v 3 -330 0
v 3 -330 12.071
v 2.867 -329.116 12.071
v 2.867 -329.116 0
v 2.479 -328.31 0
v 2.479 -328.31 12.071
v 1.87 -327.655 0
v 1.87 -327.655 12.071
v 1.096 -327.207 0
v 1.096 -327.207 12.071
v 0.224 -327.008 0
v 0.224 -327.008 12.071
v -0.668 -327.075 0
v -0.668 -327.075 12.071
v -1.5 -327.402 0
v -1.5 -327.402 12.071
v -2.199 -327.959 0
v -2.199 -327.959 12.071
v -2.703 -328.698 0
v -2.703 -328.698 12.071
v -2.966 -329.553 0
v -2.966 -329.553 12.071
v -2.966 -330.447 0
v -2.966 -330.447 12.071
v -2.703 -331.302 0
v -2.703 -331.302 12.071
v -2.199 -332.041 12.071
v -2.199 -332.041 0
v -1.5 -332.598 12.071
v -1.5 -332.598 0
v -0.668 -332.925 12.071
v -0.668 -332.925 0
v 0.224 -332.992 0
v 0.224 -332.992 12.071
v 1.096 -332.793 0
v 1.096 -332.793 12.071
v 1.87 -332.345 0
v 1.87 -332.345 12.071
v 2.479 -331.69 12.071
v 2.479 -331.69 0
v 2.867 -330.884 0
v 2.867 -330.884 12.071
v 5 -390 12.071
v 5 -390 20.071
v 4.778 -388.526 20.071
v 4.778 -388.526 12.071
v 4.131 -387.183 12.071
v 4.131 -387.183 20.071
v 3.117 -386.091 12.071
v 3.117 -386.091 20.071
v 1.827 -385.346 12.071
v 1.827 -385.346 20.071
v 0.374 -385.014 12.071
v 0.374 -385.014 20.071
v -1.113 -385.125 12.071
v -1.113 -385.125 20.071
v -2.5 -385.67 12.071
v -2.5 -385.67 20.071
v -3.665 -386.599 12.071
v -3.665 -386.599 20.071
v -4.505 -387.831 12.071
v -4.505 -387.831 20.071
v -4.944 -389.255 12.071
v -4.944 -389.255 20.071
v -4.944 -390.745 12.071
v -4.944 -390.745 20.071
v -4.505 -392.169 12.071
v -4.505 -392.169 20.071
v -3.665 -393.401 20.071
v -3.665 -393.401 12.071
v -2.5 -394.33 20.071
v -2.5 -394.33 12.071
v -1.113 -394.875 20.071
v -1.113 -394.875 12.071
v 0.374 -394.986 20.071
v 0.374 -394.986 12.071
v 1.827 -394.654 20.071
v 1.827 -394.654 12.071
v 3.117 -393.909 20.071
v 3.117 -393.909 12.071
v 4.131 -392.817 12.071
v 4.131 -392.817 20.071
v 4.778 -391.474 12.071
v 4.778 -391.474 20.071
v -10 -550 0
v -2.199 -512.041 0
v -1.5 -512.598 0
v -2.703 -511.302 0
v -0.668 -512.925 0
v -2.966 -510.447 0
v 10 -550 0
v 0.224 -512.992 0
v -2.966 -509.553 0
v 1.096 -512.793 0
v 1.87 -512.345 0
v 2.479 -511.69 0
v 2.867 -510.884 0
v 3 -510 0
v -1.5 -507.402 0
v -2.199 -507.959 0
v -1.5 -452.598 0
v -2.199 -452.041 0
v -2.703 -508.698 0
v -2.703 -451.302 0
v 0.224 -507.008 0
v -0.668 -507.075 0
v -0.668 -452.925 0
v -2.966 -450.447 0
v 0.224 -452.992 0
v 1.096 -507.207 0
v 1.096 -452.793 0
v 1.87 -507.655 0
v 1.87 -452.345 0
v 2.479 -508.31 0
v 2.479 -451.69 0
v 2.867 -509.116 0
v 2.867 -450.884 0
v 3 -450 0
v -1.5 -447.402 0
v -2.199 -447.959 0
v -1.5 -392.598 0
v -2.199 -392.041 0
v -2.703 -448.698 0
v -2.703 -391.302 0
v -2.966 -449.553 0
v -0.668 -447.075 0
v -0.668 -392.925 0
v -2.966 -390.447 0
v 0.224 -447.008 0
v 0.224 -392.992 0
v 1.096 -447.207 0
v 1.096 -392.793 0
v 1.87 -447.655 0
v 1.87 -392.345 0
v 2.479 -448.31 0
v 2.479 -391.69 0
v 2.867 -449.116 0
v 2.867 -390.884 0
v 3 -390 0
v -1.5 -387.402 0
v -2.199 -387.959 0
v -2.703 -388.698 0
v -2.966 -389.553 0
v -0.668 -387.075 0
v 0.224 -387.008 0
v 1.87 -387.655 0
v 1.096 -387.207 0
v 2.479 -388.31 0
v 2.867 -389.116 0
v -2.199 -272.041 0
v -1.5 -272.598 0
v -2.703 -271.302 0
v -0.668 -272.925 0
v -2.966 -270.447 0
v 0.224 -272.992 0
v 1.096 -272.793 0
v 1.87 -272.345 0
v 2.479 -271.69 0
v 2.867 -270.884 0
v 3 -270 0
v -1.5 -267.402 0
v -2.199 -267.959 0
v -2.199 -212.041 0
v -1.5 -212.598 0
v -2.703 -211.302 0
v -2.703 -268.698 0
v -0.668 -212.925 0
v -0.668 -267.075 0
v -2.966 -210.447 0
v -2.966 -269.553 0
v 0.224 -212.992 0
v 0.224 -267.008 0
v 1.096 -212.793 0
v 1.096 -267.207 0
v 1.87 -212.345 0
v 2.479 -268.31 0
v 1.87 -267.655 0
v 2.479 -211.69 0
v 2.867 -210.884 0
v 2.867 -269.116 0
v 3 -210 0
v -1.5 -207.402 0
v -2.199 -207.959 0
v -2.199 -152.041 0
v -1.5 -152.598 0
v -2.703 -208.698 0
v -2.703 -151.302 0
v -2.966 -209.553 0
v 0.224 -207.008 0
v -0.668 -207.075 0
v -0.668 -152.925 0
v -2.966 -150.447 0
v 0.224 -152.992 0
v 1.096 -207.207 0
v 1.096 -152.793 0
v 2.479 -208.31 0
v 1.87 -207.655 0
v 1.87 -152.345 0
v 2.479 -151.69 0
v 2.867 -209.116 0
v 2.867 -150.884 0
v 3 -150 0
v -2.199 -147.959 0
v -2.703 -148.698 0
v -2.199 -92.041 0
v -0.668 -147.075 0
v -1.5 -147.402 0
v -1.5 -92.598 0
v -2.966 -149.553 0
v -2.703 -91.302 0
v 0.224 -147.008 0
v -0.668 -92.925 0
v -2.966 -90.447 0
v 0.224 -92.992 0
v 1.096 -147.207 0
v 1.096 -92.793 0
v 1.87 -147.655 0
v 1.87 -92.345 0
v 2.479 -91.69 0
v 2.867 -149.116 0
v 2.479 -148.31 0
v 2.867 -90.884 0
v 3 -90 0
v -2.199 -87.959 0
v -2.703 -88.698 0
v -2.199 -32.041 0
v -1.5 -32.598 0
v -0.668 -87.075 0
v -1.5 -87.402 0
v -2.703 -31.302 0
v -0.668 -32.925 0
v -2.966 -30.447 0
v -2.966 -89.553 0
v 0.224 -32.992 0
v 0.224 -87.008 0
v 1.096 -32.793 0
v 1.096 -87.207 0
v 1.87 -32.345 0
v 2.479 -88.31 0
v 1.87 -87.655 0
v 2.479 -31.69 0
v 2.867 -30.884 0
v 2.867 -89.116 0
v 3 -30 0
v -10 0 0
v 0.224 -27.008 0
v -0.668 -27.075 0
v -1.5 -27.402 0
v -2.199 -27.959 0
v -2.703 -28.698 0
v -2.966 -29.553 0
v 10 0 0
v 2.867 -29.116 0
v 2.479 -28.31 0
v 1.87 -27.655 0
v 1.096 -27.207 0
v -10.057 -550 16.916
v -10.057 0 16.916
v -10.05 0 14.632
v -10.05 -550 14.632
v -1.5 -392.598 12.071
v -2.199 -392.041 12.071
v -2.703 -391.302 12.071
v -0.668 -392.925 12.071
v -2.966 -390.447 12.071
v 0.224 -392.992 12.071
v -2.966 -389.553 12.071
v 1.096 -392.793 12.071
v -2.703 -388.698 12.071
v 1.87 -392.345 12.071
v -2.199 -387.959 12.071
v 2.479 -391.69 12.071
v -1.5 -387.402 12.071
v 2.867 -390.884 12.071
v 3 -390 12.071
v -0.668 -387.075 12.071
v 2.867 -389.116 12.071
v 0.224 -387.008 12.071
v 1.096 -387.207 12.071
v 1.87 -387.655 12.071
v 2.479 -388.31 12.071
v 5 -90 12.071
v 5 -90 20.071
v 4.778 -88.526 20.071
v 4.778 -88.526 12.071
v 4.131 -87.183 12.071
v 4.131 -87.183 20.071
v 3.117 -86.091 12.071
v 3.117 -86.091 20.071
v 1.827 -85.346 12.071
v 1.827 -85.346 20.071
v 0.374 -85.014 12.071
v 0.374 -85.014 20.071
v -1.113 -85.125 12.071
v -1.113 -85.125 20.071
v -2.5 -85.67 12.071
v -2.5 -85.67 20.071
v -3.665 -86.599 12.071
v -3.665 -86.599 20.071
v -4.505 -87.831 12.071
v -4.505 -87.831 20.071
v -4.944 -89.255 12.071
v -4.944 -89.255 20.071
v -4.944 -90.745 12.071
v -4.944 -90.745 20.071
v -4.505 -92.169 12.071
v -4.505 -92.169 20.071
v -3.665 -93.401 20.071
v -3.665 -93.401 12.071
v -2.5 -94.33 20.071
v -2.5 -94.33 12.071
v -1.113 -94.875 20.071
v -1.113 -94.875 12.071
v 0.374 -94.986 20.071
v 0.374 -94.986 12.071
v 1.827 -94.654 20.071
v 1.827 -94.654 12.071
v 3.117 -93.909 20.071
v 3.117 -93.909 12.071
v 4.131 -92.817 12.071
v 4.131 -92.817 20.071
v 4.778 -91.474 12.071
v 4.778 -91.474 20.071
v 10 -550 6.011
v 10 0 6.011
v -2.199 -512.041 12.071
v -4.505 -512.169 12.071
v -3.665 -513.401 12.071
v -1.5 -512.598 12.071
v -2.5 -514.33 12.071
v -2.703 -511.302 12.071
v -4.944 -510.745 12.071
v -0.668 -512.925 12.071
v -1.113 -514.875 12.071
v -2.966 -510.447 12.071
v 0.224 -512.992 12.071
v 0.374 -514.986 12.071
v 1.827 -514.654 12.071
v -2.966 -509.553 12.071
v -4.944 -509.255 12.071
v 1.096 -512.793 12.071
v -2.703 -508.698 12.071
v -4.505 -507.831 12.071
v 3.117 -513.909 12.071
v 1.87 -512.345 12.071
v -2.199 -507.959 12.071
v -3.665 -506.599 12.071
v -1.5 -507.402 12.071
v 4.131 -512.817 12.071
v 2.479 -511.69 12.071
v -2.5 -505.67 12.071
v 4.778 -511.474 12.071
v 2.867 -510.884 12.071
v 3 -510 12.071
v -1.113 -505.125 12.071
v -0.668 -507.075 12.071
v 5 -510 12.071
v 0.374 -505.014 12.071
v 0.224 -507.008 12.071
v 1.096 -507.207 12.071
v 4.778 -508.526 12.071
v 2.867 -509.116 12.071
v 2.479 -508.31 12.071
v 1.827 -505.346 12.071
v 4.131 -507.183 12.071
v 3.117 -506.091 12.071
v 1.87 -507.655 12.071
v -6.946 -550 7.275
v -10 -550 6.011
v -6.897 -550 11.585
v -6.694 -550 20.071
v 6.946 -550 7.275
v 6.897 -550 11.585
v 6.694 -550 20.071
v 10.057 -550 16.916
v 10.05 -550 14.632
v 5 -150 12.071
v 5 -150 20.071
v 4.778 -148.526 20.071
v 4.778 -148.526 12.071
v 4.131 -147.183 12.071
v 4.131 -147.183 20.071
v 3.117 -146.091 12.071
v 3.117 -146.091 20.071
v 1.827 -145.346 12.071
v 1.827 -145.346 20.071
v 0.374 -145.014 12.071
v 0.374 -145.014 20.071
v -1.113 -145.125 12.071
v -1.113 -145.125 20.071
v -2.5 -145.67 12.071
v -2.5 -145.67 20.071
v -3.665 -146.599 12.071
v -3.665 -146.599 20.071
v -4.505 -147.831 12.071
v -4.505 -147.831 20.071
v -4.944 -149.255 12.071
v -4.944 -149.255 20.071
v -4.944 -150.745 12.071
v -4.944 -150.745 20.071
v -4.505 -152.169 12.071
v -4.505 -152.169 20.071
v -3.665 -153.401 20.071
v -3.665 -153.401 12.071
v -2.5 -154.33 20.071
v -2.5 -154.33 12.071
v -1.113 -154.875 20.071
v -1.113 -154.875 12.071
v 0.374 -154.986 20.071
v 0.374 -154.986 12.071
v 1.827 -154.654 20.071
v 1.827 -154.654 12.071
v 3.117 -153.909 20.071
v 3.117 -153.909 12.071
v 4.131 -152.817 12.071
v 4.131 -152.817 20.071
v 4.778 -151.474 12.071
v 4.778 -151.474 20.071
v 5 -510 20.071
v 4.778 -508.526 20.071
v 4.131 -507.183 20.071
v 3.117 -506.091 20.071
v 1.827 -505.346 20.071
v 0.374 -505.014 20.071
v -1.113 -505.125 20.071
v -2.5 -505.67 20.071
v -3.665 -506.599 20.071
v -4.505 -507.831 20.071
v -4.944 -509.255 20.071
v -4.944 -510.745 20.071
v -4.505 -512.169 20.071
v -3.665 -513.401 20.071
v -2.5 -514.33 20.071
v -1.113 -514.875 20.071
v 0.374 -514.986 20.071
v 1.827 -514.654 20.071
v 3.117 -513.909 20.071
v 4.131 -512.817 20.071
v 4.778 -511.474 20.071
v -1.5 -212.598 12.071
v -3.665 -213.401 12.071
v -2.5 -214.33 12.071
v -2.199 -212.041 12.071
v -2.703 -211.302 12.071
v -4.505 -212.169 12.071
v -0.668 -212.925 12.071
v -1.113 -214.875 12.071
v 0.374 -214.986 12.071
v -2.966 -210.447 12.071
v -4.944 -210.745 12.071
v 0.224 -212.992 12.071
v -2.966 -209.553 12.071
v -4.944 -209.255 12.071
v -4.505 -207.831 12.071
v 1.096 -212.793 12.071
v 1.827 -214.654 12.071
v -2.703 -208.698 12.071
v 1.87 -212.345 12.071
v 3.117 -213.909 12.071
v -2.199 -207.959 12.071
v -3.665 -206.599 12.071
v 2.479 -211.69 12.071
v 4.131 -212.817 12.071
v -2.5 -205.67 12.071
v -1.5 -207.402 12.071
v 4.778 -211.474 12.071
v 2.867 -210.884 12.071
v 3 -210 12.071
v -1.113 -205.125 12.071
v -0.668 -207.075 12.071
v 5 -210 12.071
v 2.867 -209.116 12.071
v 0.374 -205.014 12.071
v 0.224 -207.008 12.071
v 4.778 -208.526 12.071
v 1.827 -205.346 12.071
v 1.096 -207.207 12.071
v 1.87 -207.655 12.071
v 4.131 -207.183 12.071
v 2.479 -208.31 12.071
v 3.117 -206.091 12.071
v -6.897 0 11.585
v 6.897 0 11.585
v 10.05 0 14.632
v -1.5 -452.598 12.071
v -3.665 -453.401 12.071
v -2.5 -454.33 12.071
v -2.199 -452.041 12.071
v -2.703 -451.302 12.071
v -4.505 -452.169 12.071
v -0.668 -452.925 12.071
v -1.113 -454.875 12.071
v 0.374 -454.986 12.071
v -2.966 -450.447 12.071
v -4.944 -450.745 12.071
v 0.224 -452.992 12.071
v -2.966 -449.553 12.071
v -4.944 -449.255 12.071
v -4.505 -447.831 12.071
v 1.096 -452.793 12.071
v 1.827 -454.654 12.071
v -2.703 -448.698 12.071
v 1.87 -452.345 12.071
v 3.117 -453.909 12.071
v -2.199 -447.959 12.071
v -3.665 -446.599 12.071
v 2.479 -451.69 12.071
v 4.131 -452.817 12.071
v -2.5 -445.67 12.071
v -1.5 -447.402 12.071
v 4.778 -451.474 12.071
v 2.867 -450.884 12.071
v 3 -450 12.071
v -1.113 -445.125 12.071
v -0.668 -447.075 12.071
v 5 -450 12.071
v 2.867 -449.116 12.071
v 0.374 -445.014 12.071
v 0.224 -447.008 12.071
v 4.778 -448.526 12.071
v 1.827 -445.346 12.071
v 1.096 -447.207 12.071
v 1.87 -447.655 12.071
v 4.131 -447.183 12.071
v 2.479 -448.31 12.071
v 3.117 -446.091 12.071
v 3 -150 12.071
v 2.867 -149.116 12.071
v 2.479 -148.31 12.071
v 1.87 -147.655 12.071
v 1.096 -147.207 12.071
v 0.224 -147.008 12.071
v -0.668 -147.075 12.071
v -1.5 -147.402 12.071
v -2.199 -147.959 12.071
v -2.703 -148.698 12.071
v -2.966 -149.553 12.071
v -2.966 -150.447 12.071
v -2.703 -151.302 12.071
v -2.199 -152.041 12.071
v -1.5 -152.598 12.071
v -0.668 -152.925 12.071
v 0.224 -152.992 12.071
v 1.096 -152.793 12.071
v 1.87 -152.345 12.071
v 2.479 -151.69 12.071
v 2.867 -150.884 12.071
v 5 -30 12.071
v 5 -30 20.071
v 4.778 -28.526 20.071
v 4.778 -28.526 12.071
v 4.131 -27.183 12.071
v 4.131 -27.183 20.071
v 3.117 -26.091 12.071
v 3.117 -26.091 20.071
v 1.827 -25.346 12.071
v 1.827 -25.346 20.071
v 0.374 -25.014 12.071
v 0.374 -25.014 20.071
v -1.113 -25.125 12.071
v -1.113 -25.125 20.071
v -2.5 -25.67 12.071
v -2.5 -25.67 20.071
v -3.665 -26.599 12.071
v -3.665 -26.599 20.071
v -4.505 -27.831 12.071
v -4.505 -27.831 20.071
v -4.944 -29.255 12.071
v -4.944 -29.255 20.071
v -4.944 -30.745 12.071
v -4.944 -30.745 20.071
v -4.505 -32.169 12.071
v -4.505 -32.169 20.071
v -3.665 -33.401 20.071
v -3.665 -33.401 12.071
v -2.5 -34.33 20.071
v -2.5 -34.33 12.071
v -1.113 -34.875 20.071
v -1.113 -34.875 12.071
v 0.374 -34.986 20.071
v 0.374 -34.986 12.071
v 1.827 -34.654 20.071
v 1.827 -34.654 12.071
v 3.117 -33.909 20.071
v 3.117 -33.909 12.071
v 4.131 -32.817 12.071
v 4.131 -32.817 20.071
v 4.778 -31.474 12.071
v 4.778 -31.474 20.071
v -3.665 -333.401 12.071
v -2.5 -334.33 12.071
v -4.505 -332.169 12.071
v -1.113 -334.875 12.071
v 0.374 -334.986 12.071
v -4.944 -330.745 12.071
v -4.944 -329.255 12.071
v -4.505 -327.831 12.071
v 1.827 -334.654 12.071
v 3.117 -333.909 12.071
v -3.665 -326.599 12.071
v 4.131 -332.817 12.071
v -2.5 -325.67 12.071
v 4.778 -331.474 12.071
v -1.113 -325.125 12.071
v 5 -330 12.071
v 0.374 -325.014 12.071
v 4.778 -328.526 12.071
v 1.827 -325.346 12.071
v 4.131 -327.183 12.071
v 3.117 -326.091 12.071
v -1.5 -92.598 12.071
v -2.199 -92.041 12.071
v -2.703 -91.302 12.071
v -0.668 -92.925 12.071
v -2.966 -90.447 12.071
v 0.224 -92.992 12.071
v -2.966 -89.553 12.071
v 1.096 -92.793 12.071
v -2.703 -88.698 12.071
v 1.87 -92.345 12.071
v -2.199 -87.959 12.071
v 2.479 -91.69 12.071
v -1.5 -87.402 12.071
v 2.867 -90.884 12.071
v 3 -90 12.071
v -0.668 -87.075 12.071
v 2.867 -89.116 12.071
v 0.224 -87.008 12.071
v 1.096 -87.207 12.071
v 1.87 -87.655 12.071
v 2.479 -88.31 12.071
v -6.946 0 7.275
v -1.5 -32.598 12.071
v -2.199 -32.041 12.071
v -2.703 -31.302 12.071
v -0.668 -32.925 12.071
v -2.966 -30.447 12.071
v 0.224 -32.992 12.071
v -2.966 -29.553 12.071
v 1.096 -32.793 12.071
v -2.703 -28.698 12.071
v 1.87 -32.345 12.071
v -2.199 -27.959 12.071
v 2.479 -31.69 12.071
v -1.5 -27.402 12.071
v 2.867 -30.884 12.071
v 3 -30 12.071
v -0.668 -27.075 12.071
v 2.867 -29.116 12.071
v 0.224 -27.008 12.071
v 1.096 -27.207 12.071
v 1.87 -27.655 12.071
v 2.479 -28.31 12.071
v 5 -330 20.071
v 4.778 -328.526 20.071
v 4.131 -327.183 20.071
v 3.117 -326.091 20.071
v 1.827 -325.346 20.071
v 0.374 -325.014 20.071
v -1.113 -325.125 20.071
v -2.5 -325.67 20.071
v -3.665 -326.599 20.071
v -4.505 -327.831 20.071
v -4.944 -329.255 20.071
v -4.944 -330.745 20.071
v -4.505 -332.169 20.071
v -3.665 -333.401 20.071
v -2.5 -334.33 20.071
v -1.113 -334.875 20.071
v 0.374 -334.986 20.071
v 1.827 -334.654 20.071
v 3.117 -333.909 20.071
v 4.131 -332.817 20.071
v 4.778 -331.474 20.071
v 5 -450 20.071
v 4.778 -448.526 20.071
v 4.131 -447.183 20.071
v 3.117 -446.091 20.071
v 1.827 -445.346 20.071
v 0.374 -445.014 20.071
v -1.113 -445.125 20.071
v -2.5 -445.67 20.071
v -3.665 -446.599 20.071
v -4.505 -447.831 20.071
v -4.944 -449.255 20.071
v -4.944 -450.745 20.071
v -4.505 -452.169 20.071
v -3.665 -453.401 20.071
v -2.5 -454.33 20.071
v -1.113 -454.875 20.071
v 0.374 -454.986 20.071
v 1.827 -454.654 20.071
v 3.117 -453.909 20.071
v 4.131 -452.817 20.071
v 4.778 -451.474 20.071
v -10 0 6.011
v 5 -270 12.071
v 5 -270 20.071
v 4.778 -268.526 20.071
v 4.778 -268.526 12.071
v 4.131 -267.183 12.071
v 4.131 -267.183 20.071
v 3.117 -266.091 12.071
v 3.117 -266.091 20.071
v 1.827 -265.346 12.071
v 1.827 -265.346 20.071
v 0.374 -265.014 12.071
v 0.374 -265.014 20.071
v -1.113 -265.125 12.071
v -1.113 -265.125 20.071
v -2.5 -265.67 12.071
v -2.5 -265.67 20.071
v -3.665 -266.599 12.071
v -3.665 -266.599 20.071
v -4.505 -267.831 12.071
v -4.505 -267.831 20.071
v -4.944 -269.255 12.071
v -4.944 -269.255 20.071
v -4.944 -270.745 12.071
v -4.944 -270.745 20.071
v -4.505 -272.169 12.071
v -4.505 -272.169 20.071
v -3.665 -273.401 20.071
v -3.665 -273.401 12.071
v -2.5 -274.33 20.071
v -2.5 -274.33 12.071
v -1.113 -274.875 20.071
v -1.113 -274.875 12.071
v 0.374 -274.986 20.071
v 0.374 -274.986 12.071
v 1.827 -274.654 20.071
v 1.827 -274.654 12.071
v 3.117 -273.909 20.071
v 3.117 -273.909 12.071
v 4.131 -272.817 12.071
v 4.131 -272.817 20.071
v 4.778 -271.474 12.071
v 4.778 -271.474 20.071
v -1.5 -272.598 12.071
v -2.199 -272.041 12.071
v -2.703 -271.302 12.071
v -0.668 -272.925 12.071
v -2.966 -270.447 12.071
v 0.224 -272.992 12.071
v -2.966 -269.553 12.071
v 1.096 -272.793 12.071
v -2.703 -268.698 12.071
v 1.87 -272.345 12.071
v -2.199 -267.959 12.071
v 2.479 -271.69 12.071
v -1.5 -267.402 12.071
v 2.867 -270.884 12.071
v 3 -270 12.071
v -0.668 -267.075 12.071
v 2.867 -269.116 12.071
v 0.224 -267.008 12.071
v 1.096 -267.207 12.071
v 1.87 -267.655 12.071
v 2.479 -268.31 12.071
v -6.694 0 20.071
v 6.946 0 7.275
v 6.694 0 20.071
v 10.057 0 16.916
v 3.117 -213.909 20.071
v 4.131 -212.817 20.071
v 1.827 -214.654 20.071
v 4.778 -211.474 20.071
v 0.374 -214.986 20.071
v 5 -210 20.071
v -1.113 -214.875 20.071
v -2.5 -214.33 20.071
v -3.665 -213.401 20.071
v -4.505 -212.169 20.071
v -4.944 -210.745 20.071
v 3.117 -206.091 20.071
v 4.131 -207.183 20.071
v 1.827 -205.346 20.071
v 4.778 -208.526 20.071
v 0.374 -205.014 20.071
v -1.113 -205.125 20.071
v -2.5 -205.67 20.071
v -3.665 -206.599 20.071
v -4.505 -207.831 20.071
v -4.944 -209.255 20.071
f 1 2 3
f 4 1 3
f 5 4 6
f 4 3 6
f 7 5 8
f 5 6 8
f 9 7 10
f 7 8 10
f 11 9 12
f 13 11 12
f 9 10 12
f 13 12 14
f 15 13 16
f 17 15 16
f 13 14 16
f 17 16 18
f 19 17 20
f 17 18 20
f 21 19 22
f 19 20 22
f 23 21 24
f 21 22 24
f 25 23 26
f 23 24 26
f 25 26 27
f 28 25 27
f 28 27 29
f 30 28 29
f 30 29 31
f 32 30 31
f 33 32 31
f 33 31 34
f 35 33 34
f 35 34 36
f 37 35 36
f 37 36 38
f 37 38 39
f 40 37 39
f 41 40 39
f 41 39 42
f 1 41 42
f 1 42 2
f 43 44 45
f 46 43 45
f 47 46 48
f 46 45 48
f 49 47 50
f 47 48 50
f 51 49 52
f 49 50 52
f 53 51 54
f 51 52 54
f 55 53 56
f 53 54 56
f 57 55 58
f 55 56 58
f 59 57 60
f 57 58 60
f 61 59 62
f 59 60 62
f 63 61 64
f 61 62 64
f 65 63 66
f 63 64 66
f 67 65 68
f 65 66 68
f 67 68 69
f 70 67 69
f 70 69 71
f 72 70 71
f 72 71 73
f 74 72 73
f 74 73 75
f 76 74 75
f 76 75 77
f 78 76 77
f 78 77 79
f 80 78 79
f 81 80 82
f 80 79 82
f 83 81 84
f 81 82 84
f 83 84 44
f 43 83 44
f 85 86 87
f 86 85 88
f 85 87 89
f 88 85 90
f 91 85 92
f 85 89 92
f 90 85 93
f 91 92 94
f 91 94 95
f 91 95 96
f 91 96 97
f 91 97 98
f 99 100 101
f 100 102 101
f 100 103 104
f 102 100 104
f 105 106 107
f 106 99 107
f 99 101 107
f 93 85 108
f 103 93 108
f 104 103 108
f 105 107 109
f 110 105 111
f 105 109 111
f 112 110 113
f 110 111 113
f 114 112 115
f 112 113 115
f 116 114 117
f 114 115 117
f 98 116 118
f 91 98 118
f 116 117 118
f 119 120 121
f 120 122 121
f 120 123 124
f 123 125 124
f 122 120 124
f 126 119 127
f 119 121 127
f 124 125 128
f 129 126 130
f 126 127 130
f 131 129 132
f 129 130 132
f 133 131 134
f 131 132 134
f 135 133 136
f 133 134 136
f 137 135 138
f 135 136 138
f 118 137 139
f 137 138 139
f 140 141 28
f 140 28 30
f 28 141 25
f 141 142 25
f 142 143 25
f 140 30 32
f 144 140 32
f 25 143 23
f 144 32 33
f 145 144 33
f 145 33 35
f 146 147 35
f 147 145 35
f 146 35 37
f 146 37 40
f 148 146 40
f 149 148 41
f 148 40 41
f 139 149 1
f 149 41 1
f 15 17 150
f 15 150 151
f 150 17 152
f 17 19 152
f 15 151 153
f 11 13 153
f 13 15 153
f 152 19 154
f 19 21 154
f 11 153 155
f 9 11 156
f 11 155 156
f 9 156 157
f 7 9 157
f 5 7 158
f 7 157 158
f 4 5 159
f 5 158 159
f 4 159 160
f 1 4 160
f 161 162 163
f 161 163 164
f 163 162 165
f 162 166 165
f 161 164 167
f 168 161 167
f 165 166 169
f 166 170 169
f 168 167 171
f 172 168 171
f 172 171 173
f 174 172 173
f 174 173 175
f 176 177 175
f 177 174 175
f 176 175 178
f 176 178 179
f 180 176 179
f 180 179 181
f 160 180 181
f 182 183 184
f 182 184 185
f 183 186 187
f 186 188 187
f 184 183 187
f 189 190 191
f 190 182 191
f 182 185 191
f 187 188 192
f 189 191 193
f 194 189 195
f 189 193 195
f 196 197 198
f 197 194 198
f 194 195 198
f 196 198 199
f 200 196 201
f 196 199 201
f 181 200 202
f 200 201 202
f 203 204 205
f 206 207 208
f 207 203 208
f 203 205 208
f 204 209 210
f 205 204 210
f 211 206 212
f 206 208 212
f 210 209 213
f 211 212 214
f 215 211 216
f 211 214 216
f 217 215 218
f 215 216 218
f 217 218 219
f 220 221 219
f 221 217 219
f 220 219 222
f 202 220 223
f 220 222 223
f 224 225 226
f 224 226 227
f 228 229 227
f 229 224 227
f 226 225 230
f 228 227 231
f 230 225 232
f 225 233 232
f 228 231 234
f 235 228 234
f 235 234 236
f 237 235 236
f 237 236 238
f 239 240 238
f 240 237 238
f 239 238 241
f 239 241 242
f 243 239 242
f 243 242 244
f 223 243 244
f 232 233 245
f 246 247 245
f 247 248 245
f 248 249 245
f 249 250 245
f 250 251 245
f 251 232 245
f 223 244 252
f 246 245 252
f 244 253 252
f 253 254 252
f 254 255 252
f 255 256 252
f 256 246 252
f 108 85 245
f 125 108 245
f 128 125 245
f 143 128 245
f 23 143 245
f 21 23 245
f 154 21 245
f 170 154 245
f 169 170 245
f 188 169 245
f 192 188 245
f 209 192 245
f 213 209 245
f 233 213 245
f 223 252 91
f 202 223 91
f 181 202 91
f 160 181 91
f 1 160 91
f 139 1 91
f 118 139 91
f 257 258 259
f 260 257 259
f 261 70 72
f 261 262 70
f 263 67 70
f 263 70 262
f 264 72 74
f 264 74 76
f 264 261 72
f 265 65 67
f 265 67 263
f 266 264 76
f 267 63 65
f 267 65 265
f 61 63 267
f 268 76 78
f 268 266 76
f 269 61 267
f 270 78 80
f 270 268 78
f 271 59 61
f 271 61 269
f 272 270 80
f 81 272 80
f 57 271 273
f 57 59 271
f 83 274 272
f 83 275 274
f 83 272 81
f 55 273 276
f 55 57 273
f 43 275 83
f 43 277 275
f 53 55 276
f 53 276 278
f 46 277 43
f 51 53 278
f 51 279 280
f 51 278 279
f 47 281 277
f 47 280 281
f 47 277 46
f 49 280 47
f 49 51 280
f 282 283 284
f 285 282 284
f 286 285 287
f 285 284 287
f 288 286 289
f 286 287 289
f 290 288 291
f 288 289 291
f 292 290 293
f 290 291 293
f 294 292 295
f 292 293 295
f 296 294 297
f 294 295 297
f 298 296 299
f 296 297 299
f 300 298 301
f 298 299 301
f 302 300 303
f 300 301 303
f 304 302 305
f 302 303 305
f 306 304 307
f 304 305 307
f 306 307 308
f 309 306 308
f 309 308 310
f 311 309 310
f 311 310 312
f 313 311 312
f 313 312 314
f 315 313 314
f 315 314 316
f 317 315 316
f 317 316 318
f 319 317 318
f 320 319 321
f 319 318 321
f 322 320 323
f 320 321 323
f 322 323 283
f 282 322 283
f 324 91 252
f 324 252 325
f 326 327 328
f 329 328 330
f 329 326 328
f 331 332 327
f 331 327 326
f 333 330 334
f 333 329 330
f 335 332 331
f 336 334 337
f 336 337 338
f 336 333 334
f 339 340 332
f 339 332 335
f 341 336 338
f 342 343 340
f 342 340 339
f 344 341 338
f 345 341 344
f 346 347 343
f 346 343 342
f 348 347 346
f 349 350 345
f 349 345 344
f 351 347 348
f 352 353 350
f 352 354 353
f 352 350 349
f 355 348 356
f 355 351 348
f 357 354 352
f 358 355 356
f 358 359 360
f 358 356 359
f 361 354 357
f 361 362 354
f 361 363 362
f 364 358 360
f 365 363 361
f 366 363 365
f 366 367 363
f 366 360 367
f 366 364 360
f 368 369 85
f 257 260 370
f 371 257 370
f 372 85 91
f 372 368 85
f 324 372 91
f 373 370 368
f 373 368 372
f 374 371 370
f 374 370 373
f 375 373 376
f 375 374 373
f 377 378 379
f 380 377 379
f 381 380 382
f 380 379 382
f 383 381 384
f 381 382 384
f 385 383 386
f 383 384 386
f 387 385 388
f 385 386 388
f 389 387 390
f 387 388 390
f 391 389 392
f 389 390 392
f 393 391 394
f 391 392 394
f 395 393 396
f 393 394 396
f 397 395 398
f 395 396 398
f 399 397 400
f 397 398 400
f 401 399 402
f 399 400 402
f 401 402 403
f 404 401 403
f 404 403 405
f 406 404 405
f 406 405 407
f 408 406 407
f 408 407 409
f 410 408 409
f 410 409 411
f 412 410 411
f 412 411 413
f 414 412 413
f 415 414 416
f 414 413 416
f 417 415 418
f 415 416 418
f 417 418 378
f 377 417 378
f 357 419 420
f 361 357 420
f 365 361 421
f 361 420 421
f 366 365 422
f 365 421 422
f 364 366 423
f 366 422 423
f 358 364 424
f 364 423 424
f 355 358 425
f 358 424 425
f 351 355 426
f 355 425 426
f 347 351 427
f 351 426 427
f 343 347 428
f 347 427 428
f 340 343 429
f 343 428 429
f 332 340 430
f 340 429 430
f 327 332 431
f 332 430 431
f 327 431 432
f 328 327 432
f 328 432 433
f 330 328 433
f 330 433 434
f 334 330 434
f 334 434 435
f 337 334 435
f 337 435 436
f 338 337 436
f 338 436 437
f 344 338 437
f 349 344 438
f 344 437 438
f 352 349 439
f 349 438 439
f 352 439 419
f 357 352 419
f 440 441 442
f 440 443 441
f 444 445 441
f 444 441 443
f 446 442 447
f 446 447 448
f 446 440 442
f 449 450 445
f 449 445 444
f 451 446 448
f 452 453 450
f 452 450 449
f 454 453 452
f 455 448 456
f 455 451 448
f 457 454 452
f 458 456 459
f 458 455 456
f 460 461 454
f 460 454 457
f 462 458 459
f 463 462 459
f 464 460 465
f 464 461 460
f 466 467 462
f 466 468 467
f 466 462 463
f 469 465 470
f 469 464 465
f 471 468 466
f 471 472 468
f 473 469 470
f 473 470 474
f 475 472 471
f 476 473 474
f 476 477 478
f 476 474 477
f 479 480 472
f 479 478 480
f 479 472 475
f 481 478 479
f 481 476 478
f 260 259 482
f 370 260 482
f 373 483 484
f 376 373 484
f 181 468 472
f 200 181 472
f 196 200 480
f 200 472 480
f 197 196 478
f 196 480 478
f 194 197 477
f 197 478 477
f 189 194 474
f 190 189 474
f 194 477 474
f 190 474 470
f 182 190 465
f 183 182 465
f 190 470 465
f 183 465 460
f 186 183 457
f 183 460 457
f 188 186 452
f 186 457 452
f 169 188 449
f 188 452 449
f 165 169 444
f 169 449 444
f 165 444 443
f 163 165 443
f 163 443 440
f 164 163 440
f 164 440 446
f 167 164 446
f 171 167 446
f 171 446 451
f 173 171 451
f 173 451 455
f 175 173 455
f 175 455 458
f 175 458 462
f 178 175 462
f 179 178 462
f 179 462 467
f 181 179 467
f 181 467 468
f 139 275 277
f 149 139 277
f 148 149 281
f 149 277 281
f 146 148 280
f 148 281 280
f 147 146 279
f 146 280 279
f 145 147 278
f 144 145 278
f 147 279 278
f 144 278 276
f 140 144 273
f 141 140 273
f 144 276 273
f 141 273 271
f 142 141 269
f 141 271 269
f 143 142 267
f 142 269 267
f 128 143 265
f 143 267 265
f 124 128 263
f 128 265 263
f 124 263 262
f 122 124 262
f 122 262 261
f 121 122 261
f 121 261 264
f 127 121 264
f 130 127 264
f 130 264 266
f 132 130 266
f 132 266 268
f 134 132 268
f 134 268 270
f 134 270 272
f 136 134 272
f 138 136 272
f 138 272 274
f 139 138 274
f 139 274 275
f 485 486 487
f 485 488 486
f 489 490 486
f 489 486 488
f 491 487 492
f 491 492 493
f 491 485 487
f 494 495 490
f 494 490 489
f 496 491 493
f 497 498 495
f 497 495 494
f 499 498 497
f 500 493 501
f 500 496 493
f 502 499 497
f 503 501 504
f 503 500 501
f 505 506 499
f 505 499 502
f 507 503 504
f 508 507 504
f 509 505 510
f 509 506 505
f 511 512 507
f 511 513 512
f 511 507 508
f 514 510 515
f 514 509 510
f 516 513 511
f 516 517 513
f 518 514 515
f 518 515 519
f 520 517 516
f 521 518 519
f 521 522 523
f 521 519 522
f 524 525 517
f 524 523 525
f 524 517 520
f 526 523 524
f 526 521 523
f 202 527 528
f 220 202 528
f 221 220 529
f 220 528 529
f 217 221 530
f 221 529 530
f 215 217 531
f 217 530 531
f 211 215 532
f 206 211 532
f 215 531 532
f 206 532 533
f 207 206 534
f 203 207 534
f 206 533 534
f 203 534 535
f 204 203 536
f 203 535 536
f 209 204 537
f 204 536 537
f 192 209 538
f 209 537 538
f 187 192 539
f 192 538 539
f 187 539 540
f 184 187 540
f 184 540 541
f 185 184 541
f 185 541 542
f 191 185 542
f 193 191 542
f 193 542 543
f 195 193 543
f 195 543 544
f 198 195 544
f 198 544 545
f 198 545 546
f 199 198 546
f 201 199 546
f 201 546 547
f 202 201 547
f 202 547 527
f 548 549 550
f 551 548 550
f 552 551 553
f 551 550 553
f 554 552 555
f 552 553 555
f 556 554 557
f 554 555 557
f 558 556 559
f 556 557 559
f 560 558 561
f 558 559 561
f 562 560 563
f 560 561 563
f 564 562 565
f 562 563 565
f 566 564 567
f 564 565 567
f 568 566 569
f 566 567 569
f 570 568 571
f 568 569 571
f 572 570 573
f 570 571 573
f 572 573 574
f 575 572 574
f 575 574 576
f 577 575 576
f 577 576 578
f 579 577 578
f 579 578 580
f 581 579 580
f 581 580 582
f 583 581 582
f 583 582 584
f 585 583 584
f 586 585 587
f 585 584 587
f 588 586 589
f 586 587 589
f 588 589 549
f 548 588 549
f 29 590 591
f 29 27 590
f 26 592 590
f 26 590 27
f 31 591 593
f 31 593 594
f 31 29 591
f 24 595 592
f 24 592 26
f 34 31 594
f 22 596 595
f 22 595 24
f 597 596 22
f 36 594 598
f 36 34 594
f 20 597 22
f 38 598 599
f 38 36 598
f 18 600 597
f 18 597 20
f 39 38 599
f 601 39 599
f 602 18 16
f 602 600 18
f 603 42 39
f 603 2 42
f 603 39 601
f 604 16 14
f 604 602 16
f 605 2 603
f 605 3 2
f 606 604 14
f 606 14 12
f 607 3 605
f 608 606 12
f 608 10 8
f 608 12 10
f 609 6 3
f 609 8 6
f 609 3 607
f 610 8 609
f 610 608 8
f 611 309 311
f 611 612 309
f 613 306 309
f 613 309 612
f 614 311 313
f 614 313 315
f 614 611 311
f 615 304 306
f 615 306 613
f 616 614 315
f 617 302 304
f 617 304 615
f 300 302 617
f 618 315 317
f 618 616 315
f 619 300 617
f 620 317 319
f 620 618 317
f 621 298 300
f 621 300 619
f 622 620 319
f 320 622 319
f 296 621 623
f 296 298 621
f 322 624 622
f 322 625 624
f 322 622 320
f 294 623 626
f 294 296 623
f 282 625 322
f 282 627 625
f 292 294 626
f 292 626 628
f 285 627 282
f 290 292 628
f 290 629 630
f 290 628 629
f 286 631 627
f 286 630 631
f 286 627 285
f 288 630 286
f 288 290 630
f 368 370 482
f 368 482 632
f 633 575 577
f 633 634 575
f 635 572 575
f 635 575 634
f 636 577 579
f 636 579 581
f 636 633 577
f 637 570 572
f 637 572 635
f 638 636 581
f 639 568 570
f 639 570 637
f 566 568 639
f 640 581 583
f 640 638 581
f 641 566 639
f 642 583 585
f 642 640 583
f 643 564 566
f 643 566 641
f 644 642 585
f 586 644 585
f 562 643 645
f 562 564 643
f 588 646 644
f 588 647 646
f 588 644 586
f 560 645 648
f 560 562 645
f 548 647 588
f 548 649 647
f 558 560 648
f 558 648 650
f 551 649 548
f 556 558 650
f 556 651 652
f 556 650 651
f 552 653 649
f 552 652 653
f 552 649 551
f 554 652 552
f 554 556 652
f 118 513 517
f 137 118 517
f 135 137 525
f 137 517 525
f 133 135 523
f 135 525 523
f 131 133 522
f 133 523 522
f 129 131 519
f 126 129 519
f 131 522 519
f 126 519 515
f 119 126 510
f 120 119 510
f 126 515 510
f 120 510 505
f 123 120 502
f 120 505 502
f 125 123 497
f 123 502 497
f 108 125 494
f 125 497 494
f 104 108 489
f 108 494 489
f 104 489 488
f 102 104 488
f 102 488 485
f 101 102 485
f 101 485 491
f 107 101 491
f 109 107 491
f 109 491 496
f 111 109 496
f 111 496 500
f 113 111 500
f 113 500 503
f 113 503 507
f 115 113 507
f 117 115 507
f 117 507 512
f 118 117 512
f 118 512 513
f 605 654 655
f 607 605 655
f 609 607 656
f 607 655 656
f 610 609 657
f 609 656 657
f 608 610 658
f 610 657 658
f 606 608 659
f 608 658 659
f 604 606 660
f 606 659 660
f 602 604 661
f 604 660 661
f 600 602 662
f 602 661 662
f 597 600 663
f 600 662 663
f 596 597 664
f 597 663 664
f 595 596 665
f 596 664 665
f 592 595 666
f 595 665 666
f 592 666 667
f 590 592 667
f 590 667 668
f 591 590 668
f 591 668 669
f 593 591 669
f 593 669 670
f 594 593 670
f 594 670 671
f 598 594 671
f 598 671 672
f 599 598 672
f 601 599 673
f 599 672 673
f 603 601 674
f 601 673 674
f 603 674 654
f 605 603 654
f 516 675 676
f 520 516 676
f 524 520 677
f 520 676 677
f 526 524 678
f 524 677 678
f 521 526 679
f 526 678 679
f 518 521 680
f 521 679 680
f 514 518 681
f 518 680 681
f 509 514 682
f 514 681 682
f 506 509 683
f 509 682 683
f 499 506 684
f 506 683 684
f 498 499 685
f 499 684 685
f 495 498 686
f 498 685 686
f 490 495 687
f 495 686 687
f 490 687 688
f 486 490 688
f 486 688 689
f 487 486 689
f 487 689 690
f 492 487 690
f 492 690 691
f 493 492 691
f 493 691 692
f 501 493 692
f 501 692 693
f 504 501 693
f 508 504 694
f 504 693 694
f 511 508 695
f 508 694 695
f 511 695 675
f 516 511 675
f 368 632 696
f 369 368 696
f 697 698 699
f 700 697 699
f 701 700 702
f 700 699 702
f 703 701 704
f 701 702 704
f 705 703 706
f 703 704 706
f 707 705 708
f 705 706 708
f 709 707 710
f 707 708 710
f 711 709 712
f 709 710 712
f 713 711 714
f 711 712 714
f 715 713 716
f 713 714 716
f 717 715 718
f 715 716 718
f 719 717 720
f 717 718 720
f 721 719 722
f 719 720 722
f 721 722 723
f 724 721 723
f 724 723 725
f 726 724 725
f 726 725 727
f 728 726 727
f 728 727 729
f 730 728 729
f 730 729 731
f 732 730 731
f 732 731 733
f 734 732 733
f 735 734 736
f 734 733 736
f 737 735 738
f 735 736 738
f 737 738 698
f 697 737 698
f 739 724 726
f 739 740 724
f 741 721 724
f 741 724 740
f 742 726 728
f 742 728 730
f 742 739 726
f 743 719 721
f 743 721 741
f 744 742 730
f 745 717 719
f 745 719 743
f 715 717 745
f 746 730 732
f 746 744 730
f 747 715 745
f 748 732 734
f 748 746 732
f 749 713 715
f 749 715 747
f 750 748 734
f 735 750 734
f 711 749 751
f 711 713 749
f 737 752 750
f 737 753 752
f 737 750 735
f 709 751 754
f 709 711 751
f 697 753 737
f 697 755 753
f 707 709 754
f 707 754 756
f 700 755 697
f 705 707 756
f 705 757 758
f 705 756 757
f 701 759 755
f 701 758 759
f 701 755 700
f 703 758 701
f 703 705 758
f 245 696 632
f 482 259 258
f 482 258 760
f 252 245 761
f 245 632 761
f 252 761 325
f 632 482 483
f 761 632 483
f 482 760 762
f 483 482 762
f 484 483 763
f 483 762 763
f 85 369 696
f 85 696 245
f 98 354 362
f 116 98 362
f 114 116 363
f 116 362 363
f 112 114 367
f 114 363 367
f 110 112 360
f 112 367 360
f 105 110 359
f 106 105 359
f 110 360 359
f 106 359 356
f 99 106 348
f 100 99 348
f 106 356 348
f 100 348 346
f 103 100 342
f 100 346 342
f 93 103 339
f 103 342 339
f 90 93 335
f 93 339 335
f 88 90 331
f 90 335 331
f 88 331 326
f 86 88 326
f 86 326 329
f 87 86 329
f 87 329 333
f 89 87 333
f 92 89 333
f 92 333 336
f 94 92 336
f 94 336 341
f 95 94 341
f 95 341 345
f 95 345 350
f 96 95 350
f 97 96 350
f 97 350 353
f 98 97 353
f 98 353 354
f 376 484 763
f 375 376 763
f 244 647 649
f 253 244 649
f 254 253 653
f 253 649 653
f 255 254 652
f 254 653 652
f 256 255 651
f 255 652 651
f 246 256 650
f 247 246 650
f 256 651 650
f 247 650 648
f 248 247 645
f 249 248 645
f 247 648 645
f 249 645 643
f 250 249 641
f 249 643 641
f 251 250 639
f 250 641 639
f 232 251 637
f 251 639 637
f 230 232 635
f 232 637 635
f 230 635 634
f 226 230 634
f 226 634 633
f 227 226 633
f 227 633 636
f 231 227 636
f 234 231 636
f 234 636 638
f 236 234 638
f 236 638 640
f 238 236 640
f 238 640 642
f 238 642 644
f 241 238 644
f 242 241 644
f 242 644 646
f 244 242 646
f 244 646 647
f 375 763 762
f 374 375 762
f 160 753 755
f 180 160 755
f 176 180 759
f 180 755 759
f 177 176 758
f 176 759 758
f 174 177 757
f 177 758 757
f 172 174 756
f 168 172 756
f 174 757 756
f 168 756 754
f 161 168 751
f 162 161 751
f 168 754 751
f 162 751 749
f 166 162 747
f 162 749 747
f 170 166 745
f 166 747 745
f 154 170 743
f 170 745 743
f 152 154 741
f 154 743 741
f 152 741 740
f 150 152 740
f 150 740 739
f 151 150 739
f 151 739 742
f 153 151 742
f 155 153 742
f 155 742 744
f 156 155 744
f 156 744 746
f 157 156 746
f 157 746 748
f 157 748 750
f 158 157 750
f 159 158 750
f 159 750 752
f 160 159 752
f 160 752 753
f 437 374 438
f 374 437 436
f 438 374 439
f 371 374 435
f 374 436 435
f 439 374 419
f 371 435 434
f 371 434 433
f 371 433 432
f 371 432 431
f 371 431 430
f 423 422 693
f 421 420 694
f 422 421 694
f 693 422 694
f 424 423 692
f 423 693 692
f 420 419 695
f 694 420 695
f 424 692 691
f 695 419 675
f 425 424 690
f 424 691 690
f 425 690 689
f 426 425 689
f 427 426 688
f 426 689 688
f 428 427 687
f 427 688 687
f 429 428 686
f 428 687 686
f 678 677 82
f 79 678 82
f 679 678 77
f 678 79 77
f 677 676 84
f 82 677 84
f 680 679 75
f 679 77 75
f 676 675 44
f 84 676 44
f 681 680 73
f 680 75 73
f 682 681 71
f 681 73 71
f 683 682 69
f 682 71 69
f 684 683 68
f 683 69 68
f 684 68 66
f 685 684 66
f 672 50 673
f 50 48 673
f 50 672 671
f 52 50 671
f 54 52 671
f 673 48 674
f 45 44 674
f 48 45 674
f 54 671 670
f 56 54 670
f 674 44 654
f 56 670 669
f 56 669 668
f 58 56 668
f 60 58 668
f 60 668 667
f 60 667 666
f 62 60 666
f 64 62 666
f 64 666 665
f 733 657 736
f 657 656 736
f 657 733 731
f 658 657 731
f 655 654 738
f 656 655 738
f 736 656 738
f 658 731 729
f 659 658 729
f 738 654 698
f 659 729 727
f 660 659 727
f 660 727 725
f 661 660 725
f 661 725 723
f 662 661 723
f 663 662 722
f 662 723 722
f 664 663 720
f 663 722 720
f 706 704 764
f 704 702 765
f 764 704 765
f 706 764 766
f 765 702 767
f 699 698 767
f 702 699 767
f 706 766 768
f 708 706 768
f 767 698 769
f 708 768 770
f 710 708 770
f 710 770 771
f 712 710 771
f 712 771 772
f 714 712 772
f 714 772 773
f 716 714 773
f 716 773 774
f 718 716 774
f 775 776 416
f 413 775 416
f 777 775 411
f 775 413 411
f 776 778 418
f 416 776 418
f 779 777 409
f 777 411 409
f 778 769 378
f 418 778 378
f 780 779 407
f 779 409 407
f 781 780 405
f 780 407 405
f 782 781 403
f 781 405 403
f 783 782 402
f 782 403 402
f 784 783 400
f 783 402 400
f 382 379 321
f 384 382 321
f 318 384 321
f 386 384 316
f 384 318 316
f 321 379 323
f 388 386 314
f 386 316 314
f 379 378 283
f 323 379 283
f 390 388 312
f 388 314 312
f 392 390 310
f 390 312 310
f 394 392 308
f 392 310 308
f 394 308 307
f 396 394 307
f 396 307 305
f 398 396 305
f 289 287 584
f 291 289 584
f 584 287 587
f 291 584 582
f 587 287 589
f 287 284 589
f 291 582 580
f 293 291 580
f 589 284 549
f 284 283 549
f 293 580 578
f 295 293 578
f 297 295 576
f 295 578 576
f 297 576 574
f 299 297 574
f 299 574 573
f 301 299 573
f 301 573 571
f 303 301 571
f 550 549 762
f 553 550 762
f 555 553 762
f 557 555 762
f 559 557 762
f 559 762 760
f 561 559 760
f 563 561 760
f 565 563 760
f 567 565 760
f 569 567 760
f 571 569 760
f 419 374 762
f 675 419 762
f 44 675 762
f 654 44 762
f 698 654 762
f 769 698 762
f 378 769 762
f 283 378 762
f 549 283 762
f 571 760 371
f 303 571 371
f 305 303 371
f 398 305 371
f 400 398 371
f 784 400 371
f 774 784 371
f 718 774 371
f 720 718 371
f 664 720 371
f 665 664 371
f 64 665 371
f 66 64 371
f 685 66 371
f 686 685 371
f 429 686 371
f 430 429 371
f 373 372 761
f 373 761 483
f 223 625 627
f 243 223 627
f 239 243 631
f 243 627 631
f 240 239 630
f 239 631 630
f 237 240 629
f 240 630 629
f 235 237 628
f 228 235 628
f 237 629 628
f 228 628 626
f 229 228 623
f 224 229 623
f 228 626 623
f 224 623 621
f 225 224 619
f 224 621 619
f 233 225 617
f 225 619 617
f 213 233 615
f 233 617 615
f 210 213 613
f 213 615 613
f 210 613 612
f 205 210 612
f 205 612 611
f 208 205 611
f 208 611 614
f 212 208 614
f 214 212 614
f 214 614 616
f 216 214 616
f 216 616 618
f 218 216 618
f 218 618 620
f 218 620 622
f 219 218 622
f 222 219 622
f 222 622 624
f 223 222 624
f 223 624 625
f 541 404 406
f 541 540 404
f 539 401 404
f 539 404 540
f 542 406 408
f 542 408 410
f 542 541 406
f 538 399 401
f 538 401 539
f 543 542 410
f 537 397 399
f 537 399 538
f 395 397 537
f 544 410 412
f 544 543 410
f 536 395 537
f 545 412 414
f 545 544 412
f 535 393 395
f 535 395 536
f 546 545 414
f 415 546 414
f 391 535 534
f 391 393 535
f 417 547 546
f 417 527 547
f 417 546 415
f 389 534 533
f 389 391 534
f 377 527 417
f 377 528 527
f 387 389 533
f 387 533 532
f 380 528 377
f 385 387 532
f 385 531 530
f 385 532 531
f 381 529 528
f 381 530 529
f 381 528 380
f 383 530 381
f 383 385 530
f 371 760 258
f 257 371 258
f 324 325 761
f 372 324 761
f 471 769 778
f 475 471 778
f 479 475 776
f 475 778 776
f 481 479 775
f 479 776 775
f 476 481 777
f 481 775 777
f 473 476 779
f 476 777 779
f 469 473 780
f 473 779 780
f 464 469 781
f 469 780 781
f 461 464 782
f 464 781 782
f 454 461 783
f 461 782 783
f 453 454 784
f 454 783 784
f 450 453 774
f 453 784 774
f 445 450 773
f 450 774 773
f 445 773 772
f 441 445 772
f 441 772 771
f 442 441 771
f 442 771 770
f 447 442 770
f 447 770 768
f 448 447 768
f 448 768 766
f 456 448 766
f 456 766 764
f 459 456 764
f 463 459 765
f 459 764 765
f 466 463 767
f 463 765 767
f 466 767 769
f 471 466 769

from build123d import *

# Parameters (mm, degrees)
F1_DEPTH = 550
F2_R     = 5
F3_DEPTH = 8
F4_R     = 3
F5_DEPTH = 25


with BuildPart() as f1:
    # F0 (on Front) → F1 (new body)
    with BuildSketch(Plane.XZ):
        Polygon((-10.057273, 16.915944), (-10.049546, 14.631567), (-6.896546, 11.585374), (-6.946251, 7.275085), (-10, 6.01058), (-10, 0), (0, 0), (10, 0), (10, 6.01058), (6.946251, 7.275085), (6.896546, 11.585374), (10.049546, 14.631567), (10.057273, 16.915944), (6.693856, 20.07125), (0, 20.07125), (-6.693856, 20.07125), align=None)
    extrude(amount=F1_DEPTH)

    # F2 (on face) → F3 (cut)
    with BuildSketch(Plane.XY.offset(20.07125)):
        with Locations((0, -510)):
            Circle(F2_R)
        with Locations((0, -450)):
            Circle(F2_R)
        with Locations((0, -390)):
            Circle(F2_R)
        with Locations((0, -330)):
            Circle(F2_R)
        with Locations((0, -270)):
            Circle(F2_R)
        with Locations((0, -210)):
            Circle(F2_R)
        with Locations((0, -150)):
            Circle(F2_R)
        with Locations((0, -90)):
            Circle(F2_R)
        with Locations((0, -30)):
            Circle(F2_R)
    extrude(amount=-F3_DEPTH, mode=Mode.SUBTRACT)

    # F4 (on face) → F5 (cut)
    with BuildSketch(Plane.XY.offset(12.07125)):
        with Locations((0, -510)):
            Circle(F4_R)
        with Locations((0, -450)):
            Circle(F4_R)
        with Locations((0, -390)):
            Circle(F4_R)
        with Locations((0, -330)):
            Circle(F4_R)
        with Locations((0, -270)):
            Circle(F4_R)
        with Locations((0, -210)):
            Circle(F4_R)
        with Locations((0, -150)):
            Circle(F4_R)
        with Locations((0, -30)):
            Circle(F4_R)
        with Locations((0, -90)):
            Circle(F4_R)
    extrude(amount=-F5_DEPTH, mode=Mode.SUBTRACT)


solid = f1.part
